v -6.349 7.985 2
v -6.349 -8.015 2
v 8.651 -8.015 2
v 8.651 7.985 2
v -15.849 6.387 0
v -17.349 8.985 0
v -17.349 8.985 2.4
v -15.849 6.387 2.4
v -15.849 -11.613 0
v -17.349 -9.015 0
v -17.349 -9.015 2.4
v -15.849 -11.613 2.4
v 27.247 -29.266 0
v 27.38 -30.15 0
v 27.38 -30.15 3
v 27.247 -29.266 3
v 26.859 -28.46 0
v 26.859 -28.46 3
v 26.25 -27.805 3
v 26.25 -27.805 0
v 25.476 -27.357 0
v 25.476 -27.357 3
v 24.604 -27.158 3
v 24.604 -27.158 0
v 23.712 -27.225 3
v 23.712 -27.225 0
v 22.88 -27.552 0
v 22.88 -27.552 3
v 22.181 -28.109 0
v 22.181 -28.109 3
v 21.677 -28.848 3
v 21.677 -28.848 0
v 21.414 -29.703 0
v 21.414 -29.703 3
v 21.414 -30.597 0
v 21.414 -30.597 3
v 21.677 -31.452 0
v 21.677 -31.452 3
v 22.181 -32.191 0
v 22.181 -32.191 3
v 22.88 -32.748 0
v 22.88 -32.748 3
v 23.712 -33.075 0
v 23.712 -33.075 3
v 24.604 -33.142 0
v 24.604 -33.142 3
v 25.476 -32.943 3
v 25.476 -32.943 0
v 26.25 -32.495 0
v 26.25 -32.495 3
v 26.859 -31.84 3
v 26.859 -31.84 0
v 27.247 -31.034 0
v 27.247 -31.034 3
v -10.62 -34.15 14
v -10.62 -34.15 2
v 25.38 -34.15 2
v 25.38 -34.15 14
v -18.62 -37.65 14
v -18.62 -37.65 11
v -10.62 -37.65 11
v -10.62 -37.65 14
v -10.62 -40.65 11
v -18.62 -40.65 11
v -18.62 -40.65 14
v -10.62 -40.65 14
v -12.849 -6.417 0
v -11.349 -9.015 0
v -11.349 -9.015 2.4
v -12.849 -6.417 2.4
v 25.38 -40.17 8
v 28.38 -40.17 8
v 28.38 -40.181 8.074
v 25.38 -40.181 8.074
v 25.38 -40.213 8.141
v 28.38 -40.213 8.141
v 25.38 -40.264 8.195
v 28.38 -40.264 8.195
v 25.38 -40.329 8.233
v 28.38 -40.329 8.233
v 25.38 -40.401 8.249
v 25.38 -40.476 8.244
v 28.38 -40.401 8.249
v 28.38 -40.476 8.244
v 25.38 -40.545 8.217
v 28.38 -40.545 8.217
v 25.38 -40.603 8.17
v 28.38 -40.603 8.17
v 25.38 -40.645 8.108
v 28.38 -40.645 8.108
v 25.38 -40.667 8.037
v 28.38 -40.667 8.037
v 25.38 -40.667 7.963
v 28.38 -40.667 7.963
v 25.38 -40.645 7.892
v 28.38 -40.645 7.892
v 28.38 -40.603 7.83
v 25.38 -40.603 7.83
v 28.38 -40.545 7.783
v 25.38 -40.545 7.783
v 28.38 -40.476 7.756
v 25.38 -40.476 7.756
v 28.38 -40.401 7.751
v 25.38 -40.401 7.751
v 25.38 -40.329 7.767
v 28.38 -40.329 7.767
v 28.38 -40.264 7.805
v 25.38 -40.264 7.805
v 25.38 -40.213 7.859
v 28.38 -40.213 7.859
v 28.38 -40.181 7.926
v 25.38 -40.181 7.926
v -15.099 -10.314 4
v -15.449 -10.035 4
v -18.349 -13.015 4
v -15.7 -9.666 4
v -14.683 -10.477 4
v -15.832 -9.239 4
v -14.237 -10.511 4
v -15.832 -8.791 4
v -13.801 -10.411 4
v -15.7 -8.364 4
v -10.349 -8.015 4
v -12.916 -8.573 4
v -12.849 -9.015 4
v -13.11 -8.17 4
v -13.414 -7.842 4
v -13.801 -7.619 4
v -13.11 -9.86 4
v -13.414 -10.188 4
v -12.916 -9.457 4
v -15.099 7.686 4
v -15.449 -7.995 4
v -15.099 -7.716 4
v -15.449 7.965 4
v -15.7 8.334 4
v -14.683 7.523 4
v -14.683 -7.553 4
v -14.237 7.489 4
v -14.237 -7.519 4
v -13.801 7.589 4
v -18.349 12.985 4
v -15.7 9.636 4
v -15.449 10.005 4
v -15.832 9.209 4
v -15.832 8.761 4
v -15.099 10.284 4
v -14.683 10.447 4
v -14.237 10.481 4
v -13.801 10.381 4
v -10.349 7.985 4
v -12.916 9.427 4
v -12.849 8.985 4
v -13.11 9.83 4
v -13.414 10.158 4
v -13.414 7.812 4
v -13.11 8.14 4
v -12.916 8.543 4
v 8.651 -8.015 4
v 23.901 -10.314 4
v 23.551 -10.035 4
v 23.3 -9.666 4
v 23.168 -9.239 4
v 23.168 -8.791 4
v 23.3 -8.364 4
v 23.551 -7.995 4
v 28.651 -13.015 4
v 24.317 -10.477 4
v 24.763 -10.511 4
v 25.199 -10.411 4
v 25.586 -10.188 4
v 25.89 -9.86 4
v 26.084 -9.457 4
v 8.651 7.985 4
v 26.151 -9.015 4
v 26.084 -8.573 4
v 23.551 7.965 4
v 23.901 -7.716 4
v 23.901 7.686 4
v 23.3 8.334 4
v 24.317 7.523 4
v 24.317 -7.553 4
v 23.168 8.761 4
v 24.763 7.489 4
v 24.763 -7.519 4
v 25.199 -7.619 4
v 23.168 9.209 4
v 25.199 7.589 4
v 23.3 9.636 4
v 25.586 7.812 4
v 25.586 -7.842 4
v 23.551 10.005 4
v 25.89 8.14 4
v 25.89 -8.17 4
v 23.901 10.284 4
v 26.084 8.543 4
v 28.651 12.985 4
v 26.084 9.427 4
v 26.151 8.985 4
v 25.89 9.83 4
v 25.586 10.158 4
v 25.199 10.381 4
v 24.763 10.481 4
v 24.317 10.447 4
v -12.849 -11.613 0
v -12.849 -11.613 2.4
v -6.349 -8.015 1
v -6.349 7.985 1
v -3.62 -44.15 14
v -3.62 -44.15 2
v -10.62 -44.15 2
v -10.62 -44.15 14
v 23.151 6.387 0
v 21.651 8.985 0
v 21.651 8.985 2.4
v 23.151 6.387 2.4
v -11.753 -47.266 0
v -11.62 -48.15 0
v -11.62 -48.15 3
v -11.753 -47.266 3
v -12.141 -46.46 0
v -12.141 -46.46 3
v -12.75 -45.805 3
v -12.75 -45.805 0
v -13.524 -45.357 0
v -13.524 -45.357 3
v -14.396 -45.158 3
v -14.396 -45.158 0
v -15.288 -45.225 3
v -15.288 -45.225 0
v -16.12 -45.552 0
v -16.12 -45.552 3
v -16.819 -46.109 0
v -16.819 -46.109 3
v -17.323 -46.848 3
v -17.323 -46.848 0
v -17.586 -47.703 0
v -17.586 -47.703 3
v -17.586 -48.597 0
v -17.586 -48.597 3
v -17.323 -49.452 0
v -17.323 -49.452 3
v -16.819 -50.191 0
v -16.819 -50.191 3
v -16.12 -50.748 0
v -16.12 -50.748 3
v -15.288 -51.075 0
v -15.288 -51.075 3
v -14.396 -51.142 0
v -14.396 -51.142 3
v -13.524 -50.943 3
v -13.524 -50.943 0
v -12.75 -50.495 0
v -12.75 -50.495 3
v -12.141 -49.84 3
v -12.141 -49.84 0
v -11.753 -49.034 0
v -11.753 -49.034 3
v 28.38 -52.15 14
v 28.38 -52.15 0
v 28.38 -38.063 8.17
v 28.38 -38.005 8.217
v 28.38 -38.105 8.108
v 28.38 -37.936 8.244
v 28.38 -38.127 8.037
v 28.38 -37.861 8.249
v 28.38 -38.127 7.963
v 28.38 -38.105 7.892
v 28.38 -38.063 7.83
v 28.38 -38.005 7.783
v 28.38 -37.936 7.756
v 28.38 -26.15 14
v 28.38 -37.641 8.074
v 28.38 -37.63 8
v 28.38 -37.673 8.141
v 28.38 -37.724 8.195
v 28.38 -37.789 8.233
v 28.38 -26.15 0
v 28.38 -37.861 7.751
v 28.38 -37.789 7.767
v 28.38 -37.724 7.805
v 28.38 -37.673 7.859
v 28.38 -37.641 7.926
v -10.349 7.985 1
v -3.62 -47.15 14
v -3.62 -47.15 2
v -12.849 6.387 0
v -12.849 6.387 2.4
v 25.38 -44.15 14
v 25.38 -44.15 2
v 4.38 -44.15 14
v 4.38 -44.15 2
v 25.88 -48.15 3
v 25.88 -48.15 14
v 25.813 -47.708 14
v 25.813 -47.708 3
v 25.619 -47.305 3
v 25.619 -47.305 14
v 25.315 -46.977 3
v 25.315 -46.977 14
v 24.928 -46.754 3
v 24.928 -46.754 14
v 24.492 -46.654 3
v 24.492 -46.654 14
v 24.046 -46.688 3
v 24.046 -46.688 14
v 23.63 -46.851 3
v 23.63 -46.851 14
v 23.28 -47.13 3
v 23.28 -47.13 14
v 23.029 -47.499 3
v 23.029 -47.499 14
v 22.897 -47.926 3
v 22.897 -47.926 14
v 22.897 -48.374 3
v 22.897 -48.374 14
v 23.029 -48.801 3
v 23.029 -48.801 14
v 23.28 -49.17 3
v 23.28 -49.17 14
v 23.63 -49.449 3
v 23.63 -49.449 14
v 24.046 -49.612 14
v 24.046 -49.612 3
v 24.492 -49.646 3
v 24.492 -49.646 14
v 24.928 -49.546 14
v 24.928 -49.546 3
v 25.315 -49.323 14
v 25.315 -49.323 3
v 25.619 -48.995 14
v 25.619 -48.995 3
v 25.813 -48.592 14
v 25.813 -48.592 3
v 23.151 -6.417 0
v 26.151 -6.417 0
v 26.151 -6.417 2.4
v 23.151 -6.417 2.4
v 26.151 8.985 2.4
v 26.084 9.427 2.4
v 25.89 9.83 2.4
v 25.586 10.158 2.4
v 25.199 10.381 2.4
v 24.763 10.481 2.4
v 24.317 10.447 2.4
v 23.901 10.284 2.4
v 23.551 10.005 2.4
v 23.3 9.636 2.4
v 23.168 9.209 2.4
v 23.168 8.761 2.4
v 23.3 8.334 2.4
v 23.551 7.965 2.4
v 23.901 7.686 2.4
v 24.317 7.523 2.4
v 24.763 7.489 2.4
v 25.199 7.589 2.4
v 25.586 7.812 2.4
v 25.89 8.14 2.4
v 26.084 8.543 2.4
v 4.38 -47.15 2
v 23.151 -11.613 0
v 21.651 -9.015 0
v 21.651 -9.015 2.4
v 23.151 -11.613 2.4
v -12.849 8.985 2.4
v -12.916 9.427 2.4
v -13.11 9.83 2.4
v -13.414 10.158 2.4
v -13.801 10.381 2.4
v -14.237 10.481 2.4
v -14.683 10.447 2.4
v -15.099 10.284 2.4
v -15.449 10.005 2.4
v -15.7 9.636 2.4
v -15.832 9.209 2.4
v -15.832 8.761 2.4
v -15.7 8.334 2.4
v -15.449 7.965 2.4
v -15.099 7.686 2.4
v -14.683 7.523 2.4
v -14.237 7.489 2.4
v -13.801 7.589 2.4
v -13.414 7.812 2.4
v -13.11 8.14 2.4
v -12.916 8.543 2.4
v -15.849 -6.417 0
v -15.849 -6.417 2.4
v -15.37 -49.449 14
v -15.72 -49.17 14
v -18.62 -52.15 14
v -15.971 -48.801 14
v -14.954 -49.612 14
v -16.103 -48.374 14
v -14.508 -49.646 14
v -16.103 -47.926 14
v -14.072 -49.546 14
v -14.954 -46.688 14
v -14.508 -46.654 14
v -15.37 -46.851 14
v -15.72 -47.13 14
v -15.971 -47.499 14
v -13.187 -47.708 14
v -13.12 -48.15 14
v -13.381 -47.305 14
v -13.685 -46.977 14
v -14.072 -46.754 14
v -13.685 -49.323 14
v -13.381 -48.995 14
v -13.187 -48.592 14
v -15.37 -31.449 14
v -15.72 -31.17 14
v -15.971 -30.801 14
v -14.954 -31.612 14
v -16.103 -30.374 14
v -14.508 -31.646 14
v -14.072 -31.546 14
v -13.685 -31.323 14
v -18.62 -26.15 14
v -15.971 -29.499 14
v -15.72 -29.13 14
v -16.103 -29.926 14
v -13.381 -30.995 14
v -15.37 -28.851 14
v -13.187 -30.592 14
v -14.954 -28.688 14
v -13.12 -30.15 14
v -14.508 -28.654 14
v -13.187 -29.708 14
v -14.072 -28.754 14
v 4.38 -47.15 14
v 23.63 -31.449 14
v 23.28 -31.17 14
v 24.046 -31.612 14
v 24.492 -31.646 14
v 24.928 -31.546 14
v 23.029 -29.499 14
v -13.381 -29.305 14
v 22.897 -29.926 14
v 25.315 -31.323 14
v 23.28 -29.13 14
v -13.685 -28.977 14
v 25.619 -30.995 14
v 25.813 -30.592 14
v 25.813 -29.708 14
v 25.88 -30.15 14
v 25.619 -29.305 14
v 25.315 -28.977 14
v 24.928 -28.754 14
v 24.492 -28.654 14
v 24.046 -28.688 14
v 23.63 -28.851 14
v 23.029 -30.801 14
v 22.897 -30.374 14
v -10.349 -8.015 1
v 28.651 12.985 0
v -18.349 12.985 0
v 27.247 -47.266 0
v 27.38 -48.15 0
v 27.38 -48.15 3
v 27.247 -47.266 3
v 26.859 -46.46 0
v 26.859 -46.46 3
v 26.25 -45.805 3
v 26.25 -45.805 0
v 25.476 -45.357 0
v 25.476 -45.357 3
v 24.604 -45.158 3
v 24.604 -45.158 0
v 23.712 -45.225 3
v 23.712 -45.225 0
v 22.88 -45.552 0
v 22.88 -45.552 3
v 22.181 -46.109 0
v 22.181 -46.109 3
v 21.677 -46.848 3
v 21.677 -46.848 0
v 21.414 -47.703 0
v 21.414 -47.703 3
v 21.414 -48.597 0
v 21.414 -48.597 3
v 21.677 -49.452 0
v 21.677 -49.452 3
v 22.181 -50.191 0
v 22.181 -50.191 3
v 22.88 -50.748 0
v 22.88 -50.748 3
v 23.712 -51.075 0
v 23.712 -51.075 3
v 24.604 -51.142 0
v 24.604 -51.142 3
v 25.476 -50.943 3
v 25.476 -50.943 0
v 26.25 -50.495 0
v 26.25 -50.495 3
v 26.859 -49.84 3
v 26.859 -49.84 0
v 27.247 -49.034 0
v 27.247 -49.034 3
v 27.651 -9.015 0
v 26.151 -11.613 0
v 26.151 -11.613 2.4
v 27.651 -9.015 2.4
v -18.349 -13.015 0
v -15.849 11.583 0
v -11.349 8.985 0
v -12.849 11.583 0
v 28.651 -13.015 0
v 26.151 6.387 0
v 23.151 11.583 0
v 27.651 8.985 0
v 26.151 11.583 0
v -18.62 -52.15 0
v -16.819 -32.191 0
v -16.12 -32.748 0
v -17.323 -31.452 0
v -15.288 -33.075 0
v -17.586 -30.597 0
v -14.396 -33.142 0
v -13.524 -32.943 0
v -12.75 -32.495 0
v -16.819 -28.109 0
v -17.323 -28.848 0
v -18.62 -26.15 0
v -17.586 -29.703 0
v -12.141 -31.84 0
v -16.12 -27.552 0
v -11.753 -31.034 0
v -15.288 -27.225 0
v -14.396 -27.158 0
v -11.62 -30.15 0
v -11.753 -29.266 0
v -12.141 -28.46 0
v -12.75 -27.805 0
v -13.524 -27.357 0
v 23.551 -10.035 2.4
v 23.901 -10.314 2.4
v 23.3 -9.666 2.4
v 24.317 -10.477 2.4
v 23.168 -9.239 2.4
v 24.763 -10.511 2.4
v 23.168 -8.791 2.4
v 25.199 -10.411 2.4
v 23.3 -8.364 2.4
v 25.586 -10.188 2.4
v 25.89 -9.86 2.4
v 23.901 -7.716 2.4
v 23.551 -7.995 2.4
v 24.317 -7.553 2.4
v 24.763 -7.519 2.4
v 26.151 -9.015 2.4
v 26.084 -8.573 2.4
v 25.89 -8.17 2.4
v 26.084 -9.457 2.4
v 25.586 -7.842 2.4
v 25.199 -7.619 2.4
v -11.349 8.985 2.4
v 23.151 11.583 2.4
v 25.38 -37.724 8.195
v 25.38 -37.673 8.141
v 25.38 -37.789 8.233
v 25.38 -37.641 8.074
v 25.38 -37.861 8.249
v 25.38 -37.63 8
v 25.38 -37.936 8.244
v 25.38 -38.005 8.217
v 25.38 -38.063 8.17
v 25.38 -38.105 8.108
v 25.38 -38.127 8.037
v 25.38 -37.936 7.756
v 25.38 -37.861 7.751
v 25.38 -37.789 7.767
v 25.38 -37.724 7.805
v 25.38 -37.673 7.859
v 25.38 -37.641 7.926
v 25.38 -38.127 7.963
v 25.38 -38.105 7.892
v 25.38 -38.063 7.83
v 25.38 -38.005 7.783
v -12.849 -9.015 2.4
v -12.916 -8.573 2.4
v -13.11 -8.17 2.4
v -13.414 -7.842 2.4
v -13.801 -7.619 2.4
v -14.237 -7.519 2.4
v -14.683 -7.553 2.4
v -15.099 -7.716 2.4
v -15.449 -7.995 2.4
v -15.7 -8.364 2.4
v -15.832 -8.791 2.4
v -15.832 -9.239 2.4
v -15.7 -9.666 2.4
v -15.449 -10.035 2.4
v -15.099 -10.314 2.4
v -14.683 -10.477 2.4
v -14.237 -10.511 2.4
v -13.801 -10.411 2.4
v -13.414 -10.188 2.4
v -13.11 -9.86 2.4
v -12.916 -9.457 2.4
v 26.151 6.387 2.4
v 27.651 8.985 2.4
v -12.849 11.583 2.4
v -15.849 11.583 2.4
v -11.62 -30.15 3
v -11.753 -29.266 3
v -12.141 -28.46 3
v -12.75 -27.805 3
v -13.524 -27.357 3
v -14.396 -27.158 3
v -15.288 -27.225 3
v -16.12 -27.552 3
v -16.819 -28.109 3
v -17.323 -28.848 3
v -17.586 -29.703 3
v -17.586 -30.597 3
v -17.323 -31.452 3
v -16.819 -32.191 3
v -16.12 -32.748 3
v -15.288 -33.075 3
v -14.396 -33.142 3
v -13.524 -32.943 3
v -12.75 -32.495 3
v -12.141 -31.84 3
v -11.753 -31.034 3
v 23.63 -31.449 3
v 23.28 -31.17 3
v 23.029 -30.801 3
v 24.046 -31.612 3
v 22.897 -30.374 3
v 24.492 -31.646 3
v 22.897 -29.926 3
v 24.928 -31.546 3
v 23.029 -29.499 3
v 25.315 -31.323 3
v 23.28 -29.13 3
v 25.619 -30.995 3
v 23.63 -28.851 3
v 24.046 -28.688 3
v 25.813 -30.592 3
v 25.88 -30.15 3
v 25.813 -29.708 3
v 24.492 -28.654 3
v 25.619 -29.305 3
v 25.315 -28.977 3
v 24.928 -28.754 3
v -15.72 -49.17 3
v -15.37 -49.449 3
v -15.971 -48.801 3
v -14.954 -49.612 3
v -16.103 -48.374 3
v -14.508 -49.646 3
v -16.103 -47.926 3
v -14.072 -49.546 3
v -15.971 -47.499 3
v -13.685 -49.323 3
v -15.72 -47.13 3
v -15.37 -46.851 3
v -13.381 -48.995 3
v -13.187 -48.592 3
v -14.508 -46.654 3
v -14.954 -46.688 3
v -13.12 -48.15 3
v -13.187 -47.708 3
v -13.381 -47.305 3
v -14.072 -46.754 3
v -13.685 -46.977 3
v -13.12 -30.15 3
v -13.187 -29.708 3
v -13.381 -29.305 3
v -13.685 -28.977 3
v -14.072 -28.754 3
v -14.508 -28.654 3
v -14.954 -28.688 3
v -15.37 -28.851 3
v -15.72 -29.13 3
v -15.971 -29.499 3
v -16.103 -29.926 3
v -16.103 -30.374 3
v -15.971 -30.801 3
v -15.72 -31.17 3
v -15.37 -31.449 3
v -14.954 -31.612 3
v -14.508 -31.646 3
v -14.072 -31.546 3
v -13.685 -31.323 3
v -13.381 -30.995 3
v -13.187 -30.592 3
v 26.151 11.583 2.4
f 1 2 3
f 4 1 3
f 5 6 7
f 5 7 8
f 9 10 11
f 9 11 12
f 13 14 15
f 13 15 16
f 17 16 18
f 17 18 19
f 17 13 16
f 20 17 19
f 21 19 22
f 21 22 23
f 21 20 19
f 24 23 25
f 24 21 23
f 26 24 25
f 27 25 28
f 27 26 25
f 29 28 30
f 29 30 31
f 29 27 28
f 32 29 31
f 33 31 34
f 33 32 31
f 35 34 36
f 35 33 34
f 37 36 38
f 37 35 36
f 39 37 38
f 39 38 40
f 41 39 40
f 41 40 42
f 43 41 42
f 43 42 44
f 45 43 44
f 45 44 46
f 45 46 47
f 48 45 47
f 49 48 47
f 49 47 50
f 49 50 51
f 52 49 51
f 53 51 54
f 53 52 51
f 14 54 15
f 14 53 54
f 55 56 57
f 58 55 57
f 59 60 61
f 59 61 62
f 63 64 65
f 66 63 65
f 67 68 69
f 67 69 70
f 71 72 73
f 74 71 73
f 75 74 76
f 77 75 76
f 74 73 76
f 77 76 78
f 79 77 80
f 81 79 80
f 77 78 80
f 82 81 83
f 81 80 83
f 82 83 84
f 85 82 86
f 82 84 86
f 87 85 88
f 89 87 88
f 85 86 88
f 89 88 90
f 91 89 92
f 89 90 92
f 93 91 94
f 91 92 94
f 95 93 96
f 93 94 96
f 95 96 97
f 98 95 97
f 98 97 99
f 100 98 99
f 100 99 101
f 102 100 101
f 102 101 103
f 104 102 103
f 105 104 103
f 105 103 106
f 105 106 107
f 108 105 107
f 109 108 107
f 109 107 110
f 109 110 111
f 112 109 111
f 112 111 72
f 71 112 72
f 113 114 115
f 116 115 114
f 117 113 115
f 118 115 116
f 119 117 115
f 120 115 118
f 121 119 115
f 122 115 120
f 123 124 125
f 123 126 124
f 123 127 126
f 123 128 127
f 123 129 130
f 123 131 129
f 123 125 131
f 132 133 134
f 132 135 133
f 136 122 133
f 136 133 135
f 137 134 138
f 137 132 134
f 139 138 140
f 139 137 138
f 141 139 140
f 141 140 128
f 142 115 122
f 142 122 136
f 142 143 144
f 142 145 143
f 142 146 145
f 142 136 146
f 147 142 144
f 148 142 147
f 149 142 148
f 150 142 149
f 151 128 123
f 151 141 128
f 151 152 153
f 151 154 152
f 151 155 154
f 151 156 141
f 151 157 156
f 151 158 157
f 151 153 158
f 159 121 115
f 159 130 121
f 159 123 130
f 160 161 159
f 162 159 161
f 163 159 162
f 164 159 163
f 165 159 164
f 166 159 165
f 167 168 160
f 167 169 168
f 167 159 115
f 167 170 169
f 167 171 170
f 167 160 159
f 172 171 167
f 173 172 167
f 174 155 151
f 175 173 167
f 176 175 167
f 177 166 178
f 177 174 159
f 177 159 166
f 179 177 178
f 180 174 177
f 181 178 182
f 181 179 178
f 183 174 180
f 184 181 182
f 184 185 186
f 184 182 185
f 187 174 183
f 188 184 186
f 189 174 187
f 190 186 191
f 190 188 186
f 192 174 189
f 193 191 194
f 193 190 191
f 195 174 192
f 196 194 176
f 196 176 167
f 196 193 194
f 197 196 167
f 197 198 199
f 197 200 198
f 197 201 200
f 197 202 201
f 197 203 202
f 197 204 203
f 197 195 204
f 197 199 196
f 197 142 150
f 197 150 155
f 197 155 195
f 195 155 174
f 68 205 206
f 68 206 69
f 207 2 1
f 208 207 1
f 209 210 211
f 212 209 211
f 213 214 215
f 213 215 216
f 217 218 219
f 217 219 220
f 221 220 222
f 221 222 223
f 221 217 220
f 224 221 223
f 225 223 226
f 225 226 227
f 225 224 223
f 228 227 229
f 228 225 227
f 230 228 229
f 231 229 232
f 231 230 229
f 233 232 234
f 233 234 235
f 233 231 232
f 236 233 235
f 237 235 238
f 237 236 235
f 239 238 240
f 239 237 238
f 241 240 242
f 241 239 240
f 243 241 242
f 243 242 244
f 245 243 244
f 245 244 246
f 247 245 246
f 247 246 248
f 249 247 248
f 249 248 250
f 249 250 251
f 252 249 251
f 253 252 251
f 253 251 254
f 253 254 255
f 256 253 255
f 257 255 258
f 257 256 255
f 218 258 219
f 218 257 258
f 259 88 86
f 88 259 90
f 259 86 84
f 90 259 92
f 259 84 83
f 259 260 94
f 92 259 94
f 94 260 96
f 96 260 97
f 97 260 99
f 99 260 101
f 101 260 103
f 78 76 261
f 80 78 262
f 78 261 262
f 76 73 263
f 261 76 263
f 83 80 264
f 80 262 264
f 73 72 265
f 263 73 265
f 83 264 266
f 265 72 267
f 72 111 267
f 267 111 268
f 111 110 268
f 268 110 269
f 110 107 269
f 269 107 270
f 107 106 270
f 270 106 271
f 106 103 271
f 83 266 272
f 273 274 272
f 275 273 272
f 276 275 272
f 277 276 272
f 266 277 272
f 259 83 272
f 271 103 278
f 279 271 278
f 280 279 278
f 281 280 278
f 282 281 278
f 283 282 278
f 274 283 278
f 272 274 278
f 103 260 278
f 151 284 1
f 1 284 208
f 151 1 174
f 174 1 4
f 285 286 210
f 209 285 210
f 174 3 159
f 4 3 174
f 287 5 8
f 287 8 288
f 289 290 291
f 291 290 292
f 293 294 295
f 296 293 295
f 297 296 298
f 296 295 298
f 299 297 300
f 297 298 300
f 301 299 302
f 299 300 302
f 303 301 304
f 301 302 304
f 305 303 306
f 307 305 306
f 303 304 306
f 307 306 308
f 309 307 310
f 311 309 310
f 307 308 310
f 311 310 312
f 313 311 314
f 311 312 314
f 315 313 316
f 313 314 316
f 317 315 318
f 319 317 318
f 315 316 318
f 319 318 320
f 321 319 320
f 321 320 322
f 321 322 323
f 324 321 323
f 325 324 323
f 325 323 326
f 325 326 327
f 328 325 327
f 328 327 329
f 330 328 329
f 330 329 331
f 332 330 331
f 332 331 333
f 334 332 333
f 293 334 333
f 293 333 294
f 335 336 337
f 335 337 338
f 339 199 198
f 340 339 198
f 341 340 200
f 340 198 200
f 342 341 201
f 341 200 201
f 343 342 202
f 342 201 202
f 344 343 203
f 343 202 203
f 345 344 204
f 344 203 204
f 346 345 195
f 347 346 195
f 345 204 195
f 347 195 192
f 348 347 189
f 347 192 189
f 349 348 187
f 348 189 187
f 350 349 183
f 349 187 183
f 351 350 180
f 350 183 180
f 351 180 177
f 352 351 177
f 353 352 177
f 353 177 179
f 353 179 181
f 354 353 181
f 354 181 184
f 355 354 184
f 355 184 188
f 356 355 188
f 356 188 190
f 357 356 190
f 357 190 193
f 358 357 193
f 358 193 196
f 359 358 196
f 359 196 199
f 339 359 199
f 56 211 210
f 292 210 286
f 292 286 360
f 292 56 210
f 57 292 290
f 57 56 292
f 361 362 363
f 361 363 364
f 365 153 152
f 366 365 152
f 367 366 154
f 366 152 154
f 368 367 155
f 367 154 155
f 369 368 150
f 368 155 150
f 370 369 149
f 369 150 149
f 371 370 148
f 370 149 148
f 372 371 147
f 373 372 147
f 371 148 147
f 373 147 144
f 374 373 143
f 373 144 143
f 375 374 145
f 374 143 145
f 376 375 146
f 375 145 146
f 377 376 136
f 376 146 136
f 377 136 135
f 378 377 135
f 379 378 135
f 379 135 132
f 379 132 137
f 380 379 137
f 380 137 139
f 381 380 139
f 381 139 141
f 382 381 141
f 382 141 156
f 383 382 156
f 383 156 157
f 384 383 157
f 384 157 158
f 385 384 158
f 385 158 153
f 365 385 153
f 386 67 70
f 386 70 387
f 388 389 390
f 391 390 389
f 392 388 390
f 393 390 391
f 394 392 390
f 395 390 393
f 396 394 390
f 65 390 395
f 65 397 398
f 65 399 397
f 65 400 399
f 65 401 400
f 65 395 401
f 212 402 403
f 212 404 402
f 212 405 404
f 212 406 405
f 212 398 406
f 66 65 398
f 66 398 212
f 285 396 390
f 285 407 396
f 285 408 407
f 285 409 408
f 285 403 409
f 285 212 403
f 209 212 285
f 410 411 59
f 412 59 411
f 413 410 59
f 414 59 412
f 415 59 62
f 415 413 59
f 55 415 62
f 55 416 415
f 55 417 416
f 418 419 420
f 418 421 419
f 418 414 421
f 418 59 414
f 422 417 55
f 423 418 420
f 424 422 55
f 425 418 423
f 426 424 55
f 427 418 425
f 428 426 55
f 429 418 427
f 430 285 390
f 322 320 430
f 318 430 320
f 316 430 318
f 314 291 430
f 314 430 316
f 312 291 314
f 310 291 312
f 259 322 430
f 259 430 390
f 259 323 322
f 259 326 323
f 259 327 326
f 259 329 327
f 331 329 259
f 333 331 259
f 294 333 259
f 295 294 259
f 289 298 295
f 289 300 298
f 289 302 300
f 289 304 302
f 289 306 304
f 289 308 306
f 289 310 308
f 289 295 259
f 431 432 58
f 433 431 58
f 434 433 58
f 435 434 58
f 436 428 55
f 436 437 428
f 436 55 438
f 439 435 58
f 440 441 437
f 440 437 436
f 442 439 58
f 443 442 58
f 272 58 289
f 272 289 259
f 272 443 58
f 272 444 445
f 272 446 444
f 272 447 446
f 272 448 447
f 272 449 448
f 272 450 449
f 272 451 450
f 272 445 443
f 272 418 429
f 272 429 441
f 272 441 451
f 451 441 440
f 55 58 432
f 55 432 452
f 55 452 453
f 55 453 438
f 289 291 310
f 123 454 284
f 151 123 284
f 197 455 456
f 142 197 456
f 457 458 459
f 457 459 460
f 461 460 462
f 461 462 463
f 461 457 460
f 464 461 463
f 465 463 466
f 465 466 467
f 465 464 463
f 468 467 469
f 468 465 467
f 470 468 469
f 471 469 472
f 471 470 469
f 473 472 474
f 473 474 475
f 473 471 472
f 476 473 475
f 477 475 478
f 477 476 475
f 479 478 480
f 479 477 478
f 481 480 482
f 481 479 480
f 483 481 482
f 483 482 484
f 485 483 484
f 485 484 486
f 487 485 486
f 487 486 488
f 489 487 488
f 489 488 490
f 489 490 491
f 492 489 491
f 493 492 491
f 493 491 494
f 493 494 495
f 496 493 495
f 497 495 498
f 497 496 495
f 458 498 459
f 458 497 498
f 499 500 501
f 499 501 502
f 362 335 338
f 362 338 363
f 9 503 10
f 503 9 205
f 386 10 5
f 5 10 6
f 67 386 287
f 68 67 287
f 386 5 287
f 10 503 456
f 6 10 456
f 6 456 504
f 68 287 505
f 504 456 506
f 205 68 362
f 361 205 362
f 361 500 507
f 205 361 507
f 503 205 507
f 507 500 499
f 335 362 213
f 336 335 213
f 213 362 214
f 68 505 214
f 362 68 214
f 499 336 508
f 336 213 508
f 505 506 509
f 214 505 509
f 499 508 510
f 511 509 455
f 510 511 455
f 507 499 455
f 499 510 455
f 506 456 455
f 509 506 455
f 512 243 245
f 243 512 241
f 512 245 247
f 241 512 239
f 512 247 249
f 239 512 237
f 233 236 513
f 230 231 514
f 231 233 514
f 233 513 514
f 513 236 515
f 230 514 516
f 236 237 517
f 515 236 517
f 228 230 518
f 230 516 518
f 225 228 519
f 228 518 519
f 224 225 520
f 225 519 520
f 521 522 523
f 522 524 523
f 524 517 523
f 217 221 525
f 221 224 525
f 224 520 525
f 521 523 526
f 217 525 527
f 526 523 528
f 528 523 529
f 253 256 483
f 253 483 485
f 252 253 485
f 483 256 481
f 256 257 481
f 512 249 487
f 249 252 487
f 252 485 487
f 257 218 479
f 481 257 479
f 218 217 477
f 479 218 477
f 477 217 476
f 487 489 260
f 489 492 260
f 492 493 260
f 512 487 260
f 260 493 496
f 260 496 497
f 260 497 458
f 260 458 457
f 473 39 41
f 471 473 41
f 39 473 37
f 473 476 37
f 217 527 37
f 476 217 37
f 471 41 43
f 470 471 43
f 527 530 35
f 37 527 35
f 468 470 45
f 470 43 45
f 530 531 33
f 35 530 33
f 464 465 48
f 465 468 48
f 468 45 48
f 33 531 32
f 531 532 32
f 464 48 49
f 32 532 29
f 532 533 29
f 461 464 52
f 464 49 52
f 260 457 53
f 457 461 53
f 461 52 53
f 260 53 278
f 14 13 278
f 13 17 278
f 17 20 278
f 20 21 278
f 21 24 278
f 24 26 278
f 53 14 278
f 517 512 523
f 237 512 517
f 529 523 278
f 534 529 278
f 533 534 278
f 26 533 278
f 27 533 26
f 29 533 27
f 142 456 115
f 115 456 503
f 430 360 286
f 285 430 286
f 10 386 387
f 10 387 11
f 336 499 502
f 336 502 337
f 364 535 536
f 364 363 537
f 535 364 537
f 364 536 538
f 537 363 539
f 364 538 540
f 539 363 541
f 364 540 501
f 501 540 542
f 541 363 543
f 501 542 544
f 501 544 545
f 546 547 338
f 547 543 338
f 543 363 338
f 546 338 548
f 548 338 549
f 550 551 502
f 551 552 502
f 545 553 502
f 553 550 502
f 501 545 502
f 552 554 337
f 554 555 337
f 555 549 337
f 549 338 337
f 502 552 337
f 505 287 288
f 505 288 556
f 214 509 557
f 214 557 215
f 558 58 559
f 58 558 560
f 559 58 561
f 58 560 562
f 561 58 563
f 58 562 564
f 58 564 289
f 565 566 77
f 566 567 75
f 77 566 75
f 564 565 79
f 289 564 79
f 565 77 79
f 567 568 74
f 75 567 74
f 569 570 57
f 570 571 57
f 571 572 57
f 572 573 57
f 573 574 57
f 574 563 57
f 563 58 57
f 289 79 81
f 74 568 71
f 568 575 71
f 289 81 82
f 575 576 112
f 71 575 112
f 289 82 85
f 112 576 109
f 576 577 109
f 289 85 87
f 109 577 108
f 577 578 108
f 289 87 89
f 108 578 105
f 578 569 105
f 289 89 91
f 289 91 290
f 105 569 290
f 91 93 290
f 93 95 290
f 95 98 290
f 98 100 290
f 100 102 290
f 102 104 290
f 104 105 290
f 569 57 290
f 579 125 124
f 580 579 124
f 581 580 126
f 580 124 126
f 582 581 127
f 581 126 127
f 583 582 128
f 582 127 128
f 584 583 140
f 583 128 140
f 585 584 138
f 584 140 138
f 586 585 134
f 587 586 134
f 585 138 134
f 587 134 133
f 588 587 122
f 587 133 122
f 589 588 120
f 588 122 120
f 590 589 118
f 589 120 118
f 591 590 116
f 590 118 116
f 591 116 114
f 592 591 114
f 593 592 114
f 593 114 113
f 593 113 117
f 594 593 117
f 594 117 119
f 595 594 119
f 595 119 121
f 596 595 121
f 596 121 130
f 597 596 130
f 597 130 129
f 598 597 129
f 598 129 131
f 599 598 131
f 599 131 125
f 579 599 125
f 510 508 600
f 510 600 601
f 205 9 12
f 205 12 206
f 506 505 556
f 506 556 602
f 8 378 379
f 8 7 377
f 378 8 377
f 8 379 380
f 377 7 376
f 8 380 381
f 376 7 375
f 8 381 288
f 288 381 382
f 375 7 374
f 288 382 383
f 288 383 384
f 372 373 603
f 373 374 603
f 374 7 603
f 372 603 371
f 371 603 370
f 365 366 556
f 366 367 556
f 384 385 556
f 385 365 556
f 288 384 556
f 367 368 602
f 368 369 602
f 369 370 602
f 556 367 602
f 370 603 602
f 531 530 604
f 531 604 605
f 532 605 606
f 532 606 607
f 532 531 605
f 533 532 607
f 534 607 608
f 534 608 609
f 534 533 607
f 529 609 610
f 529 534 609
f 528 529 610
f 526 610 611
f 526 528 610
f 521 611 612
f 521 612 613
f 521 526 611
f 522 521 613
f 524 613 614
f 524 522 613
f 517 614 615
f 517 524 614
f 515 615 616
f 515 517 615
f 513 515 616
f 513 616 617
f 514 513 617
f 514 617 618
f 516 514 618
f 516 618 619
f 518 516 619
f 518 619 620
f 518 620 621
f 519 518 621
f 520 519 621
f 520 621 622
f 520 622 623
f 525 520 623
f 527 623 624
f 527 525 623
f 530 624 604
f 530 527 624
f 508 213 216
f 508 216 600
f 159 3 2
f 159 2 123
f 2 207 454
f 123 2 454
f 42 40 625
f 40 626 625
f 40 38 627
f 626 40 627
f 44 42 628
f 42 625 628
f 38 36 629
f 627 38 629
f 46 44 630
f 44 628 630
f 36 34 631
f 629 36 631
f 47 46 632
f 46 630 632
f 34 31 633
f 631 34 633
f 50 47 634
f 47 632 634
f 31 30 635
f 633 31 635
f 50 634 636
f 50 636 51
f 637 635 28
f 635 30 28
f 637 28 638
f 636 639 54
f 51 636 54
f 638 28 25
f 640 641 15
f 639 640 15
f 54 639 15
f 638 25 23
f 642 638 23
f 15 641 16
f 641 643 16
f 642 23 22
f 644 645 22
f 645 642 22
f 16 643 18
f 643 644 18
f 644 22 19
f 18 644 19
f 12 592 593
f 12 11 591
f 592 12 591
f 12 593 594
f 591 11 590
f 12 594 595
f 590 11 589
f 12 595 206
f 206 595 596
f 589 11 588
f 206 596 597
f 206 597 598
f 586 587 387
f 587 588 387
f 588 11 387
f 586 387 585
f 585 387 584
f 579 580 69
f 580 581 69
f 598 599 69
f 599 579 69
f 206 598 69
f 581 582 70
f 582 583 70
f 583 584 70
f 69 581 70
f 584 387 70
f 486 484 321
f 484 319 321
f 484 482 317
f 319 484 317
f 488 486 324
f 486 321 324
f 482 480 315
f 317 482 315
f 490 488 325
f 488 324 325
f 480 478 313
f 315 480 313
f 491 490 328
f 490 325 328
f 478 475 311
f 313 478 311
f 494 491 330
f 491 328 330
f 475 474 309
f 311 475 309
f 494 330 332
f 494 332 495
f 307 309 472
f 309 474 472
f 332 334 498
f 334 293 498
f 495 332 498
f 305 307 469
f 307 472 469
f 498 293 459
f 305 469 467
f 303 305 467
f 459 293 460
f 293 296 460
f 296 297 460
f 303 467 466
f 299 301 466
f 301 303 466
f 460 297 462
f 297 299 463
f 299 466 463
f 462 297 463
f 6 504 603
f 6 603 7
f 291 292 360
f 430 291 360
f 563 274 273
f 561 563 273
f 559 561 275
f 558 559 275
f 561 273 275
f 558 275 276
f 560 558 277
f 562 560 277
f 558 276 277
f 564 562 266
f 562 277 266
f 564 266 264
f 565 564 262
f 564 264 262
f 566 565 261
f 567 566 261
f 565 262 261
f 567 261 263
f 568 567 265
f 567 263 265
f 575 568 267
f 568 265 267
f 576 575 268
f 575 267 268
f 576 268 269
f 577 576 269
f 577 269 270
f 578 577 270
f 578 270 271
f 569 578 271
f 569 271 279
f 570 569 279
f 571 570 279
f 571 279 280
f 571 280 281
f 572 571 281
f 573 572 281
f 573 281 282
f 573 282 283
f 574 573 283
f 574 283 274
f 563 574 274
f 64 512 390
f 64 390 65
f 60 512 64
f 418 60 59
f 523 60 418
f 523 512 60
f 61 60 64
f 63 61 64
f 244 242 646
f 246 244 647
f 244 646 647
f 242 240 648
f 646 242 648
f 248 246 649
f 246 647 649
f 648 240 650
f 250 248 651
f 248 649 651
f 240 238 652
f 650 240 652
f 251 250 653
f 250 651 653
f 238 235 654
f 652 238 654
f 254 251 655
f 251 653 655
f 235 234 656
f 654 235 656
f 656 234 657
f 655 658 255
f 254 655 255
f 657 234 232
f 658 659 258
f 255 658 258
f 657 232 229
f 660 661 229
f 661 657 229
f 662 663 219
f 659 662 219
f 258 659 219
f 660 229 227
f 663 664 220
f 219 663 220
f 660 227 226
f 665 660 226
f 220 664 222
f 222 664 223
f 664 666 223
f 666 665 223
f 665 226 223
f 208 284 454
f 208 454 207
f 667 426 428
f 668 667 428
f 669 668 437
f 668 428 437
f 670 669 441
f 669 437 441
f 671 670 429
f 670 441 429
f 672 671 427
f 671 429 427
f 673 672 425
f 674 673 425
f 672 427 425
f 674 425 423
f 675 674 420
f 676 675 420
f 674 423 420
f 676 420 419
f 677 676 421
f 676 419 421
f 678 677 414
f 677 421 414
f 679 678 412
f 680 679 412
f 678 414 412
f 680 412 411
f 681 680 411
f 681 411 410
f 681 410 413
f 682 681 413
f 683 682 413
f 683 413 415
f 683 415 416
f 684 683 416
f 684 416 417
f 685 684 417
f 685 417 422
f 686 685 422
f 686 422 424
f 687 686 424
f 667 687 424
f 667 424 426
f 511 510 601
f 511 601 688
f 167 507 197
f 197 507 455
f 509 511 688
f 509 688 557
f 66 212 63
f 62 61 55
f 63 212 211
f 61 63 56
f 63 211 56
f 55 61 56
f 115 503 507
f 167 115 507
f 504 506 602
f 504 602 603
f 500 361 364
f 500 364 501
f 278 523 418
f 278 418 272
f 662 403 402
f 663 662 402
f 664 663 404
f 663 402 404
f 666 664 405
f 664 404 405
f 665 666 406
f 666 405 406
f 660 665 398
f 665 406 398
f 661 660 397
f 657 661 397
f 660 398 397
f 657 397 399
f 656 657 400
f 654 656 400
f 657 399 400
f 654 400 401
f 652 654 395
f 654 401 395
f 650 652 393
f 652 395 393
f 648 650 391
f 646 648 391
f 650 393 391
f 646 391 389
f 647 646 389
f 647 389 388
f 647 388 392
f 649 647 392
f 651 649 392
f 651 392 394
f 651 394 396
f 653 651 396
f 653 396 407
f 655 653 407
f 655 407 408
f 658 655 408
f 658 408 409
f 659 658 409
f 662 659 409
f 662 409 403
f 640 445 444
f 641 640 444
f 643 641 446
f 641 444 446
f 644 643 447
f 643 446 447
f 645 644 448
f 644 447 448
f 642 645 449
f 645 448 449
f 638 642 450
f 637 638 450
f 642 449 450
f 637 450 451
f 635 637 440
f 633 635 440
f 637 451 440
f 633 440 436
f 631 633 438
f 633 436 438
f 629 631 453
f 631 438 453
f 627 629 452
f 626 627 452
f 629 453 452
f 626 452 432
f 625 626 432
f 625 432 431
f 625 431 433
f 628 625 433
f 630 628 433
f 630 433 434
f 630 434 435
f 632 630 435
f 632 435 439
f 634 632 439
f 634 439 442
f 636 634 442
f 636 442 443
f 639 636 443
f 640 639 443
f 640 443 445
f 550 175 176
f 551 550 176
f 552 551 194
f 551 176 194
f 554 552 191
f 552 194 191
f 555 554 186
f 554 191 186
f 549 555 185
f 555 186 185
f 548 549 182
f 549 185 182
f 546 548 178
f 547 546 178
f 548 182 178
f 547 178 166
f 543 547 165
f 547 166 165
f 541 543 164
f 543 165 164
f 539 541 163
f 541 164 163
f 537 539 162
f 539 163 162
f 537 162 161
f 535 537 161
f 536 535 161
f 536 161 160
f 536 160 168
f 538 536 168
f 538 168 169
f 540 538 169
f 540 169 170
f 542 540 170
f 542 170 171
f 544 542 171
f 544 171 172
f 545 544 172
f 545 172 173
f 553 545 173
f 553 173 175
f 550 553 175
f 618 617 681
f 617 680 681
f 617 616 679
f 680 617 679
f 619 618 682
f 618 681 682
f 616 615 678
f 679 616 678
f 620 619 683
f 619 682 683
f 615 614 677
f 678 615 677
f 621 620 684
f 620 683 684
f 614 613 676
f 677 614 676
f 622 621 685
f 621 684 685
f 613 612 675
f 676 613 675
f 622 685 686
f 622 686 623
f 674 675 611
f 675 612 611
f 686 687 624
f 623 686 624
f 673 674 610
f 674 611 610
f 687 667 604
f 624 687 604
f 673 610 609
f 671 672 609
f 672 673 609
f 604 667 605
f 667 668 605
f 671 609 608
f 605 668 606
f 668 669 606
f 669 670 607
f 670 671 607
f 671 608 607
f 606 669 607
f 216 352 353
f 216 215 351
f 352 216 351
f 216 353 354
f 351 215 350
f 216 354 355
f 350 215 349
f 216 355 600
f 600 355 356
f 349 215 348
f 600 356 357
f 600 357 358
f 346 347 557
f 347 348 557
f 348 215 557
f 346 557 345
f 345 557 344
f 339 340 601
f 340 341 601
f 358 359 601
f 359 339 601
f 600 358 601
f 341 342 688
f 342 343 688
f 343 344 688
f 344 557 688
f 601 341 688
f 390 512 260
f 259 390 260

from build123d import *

# Parameters (mm, degrees)
F0_W      = 19
F0_H      = 16
F1_DEPTH  = 2
F0_W_2    = 20
F2_DEPTH  = 4
F3_W      = 47
F3_H      = 26
F4_DEPTH  = 14
F5_DEPTH  = 2
F6_R      = 0.25
F7_DEPTH  = 5
F8_W      = 1.5
F8_H      = 3
F9_DEPTH  = 8
F10_R     = 1.5
F11_DEPTH = 4
F12_R     = 1.5
F13_DEPTH = 25
F14_W     = 4
F14_H     = 16
F15_DEPTH = 1
F16_R     = 3
F17_DEPTH = 3
F19_DEPTH = 2.4


with BuildPart() as f1:
    # F0 (on Top) → F1 (new body)
    with BuildSketch(Plane.XY):
        with Locations((-0.84896, -0.01496)):
            Rectangle(F0_W, F0_H)
    extrude(amount=F1_DEPTH)

    # F0 (on Top) → F2 (join)
    with BuildSketch(Plane.XY):
        Polygon((-10.34896, 12.98504), (-10.34896, 7.98504), (8.65104, 7.98504), (28.65104, 7.98504), (28.65104, 12.98504), align=None)
        Polygon((-10.34896, -8.01496), (-10.34896, 7.98504), (-10.34896, 12.98504), (-18.34896, 12.98504), (-18.34896, -13.01496), (-10.34896, -13.01496), align=None)
        with Locations((18.65104, -0.01496)):
            Rectangle(F0_W_2, F0_H)
        Polygon((8.65104, -8.01496), (-10.34896, -8.01496), (-10.34896, -13.01496), (28.65104, -13.01496), (28.65104, -8.01496), align=None)
    extrude(amount=F2_DEPTH)

    # F10 (on face) → F11 (cut)
    with BuildSketch(Plane.XY.offset(4)):
        with Locations((-14.34896, 8.98504)):
            Circle(F10_R)
        with Locations((24.65104, 8.98504)):
            Circle(F10_R)
        with Locations((24.65104, -9.01496)):
            Circle(F10_R)
        with Locations((-14.34896, -9.01496)):
            Circle(F10_R)
    extrude(amount=-F11_DEPTH, mode=Mode.SUBTRACT)

    # F14 (on face) → F15 (cut)
    with BuildSketch(Plane.XY.offset(2)):
        with Locations((-8.34896, -0.01496)):
            Rectangle(F14_W, F14_H)
    extrude(amount=-F15_DEPTH, mode=Mode.SUBTRACT)

    # F18 (on face) → F19 (cut)
    with BuildSketch(Plane.XY):
        Polygon((23.15104, -6.416884), (21.65104, -9.01496), (23.15104, -11.613036), (26.15104, -11.613036), (27.65104, -9.01496), (26.15104, -6.416884), align=None)
        Polygon((-12.84896, -11.613036), (-11.34896, -9.01496), (-12.84896, -6.416884), (-15.84896, -6.416884), (-17.34896, -9.01496), (-15.84896, -11.613036), align=None)
        Polygon((-12.84896, 6.386964), (-11.34896, 8.98504), (-12.84896, 11.583116), (-15.84896, 11.583116), (-17.34896, 8.98504), (-15.84896, 6.386964), align=None)
        Polygon((23.15104, 11.583116), (21.65104, 8.98504), (23.15104, 6.386964), (26.15104, 6.386964), (27.65104, 8.98504), (26.15104, 11.583116), align=None)
    extrude(amount=F19_DEPTH, mode=Mode.SUBTRACT)


with BuildPart() as f4:
    # F3 (on Top) → F4 (new body)
    with BuildSketch(Plane.XY):
        with Locations((4.879999, -39.15)):
            Rectangle(F3_W, F3_H)
        Polygon((-10.620001, -44.15), (-10.620001, -34.15), (25.379999, -34.15), (25.379999, -44.15), (4.379999, -44.15), (4.379999, -47.15), (-3.620001, -47.15), (-3.620001, -44.15), align=None, mode=Mode.SUBTRACT)
    extrude(amount=F4_DEPTH)

    # F3 (on Top) → F5 (join)
    with BuildSketch(Plane.XY):
        Polygon((25.379999, -34.15), (-10.620001, -34.15), (-10.620001, -44.15), (-3.620001, -44.15), (-3.620001, -47.15), (4.379999, -47.15), (4.379999, -44.15), (25.379999, -44.15), align=None)
    extrude(amount=F5_DEPTH)

    # F6 (on face) → F7 (cut)
    with BuildSketch(Plane.YZ.offset(28.379999)):
        with Locations((-37.88, 8)):
            Circle(F6_R)
        with Locations((-40.42, 8)):
            Circle(F6_R)
    extrude(amount=-F7_DEPTH, mode=Mode.SUBTRACT)

    # F8 (on face) → F9 (cut)
    with BuildSketch(Plane(origin=(-18.620001, 0, 0), x_dir=(0, -1, 0), z_dir=(-1, 0, 0))):
        with Locations((38.4, 12.5)):
            Rectangle(F8_W, F8_H)
        with Locations((39.9, 12.5)):
            Rectangle(F8_W, F8_H)
    extrude(amount=-F9_DEPTH, mode=Mode.SUBTRACT)

    # F12 (on face) → F13 (cut)
    with BuildSketch(Plane.XY.offset(14)):
        with Locations((-14.620001, -30.15)):
            Circle(F12_R)
        with Locations((24.379999, -30.15)):
            Circle(F12_R)
        with Locations((24.379999, -48.15)):
            Circle(F12_R)
        with Locations((-14.620001, -48.15)):
            Circle(F12_R)
    extrude(amount=-F13_DEPTH, mode=Mode.SUBTRACT)

    # F16 (on face) → F17 (cut)
    with BuildSketch(Plane.XY):
        with Locations((24.379999, -30.15)):
            Circle(F16_R)
        with Locations((-14.620001, -30.15)):
            Circle(F16_R)
        with Locations((24.379999, -48.15)):
            Circle(F16_R)
        with Locations((-14.620001, -48.15)):
            Circle(F16_R)
    extrude(amount=F17_DEPTH, mode=Mode.SUBTRACT)


solid = Compound([f1.part, f4.part])
